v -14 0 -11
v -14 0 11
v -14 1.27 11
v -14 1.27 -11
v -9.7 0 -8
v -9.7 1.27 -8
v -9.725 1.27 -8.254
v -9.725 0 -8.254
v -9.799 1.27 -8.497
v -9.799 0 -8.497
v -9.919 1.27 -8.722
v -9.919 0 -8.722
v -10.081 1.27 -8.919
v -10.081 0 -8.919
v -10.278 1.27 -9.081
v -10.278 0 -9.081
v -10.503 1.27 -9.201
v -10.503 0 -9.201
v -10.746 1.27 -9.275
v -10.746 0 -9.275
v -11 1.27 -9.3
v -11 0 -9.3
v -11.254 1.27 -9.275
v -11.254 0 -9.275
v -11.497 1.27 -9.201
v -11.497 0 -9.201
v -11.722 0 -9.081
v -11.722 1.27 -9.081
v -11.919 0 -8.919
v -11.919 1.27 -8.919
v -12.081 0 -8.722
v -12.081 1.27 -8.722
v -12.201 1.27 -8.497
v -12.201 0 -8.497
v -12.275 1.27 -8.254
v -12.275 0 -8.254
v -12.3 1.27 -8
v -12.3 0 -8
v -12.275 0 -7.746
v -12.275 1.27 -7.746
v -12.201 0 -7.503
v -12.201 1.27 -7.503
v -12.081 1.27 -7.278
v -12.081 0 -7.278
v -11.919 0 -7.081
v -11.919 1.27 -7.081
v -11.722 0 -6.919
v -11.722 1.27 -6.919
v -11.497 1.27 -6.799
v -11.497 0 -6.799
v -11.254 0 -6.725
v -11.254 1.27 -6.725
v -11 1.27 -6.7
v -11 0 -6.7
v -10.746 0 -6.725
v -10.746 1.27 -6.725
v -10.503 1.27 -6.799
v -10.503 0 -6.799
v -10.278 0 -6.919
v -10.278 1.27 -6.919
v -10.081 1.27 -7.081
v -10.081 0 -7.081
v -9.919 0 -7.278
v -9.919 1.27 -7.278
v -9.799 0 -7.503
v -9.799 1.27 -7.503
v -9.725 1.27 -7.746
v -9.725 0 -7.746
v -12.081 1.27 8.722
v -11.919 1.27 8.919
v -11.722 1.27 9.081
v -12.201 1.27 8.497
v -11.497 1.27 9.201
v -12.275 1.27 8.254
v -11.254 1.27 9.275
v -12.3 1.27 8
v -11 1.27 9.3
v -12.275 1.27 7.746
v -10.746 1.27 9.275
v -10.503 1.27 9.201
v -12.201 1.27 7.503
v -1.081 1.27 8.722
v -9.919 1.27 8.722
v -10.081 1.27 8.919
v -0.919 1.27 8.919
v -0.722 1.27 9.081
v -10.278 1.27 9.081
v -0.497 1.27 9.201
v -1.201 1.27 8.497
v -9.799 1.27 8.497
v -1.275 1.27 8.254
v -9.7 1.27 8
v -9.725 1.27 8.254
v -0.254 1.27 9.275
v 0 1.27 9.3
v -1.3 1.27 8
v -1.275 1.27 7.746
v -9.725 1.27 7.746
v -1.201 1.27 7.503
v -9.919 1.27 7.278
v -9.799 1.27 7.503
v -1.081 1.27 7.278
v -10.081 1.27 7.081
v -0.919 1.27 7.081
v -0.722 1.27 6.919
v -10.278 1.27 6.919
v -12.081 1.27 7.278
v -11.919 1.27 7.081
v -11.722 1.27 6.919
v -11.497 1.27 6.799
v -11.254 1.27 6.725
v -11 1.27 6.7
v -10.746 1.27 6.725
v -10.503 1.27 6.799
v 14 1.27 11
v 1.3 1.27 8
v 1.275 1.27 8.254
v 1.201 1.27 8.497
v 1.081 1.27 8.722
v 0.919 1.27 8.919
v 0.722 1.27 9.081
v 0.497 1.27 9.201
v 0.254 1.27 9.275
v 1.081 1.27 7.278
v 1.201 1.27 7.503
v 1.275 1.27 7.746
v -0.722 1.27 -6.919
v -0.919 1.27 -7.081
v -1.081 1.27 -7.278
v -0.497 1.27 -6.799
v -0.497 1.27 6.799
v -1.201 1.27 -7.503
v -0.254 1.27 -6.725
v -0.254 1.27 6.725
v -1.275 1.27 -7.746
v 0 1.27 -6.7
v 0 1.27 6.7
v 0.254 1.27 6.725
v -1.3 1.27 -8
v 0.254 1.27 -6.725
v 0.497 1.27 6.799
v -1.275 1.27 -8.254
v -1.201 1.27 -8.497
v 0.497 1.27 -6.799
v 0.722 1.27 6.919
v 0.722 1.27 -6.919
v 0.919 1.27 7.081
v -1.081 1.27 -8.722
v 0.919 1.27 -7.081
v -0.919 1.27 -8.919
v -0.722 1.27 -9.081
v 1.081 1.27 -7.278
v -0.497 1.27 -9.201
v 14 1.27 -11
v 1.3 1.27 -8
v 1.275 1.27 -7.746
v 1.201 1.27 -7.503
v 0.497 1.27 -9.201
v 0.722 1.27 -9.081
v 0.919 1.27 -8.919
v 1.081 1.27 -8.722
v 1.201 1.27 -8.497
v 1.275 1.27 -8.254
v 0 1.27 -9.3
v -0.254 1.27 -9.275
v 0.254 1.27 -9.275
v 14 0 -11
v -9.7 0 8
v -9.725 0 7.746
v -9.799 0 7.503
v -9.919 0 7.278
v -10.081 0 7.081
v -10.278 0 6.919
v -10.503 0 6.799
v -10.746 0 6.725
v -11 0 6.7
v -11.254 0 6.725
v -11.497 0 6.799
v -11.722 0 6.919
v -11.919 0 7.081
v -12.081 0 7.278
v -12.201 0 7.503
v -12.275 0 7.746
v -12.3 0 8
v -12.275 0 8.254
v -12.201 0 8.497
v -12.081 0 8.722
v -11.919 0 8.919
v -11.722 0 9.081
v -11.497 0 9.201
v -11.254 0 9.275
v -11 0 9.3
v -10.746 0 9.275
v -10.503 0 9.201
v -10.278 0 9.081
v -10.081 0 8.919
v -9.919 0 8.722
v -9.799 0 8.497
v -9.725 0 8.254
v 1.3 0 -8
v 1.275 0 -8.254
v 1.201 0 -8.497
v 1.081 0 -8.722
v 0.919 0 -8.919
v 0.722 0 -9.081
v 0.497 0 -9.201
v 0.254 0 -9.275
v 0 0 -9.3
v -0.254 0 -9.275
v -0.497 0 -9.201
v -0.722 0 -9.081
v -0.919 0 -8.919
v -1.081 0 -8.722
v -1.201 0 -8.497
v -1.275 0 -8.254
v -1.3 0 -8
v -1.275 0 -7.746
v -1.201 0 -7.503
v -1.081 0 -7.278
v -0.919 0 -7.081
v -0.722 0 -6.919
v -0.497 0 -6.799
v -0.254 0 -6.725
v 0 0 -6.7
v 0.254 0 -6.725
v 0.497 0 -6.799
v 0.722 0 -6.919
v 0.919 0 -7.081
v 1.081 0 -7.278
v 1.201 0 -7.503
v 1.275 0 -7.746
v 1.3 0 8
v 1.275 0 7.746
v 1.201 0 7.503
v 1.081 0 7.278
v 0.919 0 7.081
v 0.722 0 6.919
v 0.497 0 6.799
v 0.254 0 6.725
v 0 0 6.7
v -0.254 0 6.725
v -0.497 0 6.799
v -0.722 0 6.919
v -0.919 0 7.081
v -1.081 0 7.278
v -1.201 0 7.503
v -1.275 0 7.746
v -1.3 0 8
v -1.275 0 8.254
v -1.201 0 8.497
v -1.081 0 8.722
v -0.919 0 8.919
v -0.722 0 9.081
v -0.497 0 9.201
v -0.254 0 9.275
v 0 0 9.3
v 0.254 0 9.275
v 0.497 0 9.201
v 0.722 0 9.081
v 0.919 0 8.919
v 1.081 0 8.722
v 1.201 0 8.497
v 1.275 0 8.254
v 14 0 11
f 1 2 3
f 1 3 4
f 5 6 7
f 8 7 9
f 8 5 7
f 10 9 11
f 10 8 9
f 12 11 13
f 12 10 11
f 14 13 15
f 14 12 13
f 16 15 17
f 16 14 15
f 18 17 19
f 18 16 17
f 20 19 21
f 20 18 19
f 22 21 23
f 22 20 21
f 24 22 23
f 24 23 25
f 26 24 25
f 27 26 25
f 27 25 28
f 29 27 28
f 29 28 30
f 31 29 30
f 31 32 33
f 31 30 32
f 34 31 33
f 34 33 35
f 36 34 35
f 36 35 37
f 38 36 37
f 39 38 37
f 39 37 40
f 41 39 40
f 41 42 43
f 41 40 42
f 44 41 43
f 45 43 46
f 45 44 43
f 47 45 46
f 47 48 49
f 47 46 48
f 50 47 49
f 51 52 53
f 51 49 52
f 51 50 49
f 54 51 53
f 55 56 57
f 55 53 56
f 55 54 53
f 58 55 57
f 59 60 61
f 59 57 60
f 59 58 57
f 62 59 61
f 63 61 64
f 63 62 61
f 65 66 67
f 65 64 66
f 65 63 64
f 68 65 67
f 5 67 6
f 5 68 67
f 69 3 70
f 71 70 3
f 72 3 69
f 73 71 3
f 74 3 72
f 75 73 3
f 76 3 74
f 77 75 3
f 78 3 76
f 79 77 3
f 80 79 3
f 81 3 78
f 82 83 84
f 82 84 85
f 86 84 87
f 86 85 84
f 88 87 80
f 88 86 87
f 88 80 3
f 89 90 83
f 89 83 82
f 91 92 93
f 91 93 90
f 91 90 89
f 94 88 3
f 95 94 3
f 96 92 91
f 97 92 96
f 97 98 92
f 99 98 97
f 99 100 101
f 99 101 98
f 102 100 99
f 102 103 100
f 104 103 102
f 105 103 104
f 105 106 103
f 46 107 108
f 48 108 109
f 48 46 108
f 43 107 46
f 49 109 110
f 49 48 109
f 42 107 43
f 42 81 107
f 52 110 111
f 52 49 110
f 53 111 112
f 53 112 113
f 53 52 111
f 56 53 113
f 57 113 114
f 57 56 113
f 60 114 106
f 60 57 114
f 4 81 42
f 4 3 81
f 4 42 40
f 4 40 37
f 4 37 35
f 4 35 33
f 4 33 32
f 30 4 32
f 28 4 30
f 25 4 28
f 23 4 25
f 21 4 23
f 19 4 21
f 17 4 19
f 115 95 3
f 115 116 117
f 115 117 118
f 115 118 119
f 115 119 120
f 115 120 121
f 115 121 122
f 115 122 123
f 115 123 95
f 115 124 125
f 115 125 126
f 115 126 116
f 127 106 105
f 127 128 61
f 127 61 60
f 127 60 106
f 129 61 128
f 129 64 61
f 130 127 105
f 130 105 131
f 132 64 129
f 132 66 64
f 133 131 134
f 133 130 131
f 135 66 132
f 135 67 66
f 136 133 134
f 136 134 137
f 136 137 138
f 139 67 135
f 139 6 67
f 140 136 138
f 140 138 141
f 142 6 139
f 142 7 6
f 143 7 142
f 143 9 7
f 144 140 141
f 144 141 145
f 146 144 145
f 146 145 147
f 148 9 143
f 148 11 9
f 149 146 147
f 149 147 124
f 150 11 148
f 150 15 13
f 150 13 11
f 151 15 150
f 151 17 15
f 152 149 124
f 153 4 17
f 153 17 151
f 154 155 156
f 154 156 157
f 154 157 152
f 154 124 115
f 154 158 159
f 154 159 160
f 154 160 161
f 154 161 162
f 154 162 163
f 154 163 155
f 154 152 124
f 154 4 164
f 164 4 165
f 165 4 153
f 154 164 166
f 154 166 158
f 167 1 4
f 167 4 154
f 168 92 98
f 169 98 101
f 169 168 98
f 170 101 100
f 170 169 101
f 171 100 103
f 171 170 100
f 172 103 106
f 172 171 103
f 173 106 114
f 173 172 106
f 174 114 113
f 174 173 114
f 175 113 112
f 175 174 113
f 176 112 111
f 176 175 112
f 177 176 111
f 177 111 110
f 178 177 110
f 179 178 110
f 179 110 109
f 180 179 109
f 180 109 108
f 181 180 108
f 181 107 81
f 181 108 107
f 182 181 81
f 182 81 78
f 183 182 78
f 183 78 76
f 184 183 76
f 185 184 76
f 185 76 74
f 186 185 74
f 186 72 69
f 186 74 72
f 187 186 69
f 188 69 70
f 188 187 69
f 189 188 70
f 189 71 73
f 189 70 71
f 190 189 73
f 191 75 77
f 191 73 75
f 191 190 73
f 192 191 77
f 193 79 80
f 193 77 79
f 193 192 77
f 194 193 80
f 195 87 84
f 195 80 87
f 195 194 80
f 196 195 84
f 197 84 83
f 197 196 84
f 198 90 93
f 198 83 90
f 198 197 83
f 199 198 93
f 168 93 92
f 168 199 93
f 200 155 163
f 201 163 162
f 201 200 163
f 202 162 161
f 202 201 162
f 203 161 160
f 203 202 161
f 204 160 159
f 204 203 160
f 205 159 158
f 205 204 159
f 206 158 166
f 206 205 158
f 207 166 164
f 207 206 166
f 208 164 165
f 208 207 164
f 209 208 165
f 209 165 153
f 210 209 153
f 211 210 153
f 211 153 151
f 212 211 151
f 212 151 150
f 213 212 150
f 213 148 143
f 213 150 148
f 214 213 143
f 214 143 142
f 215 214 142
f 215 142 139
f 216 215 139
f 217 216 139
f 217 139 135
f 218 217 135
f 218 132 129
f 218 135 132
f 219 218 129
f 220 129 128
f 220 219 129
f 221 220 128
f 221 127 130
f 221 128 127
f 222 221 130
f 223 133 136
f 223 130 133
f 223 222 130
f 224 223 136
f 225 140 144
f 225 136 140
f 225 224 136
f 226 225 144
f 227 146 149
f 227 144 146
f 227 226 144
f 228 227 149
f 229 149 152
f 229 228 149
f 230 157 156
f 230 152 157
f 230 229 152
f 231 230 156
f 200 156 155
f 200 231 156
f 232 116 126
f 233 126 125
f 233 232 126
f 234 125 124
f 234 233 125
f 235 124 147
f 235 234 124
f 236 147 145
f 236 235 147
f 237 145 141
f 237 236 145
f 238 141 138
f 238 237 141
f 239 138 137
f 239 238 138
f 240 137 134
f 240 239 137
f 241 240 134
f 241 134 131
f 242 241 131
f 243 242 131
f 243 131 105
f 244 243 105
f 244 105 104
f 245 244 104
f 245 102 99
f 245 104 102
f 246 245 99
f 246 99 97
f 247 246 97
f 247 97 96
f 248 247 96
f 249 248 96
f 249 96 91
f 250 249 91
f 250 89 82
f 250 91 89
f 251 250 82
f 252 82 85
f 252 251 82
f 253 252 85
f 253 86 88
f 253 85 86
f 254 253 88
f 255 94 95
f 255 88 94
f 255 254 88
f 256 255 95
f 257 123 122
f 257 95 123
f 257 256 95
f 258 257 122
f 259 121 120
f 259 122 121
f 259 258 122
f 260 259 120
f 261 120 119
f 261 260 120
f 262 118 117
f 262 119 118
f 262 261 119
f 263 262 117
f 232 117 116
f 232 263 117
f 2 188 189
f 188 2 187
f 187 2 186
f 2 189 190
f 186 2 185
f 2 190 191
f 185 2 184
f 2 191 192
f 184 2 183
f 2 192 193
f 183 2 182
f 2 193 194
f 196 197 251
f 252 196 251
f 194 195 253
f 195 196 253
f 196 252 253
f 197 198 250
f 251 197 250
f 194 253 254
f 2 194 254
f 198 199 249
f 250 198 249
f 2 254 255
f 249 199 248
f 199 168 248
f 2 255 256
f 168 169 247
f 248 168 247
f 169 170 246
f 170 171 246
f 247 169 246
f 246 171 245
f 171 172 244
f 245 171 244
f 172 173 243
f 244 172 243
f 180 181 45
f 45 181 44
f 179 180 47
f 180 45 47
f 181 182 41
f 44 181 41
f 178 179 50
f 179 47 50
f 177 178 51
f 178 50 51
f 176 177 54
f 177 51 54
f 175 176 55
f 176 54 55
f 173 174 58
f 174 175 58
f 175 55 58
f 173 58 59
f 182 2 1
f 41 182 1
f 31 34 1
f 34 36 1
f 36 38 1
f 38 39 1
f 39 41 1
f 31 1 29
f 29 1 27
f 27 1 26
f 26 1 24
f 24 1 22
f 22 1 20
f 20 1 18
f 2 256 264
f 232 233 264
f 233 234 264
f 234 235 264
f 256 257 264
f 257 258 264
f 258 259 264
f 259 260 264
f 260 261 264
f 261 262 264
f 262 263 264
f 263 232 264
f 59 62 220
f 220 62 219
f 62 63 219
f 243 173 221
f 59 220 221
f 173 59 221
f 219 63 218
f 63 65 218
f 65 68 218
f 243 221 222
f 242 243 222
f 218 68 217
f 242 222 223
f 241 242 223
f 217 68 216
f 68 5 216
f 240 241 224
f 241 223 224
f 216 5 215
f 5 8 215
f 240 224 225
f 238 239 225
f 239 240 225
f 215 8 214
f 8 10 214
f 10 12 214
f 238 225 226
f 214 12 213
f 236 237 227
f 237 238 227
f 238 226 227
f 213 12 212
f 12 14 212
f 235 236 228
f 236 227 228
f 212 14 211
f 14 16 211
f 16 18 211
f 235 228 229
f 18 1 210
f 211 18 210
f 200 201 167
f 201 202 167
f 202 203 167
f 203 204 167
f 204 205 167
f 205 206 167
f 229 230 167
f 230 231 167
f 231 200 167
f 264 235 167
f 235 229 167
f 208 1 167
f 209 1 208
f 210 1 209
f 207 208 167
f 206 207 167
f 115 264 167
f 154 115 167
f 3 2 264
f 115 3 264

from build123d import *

# Parameters (mm, degrees)
SKETCH1_W            = 28
SKETCH1_H            = 22
BOSS_EXTRUDE1_DEPTH  = 1.27
SKETCH2_R            = 1.2999974
CUT_EXTRUDE2_DEPTH   = 2.27
LPATTERN1_COUNT      = 2
LPATTERN1_PITCH      = 11
LPATTERN1_COUNT_DIR2 = 2
LPATTERN1_PITCH_DIR2 = 16


with BuildPart() as part:
    # Sketch1 → Boss-Extrude1 (new body)
    with BuildSketch(Plane(origin=(0, 0, 0), x_dir=(1, 0, 0), z_dir=(0, 1, 0))):
        Rectangle(SKETCH1_W, SKETCH1_H)
    extrude(amount=BOSS_EXTRUDE1_DEPTH)

    # Sketch2 → Cut-Extrude2 (cut, through all)
    with BuildSketch(Plane(origin=(0, 0, 0), x_dir=(1, 0, 0), z_dir=(0, 1, 0))):
        with Locations((-11, 8)):
            Circle(SKETCH2_R)
    cut_extrude2 = extrude(amount=CUT_EXTRUDE2_DEPTH, mode=Mode.SUBTRACT)

    # LPattern1: Cut-Extrude2 2 × 2
    with Locations(*[(i * LPATTERN1_PITCH, 0, j * LPATTERN1_PITCH_DIR2) for i in range(LPATTERN1_COUNT) for j in range(LPATTERN1_COUNT_DIR2) if (i, j) != (0, 0)]):
        add(cut_extrude2, mode=Mode.SUBTRACT)


solid = part.part
